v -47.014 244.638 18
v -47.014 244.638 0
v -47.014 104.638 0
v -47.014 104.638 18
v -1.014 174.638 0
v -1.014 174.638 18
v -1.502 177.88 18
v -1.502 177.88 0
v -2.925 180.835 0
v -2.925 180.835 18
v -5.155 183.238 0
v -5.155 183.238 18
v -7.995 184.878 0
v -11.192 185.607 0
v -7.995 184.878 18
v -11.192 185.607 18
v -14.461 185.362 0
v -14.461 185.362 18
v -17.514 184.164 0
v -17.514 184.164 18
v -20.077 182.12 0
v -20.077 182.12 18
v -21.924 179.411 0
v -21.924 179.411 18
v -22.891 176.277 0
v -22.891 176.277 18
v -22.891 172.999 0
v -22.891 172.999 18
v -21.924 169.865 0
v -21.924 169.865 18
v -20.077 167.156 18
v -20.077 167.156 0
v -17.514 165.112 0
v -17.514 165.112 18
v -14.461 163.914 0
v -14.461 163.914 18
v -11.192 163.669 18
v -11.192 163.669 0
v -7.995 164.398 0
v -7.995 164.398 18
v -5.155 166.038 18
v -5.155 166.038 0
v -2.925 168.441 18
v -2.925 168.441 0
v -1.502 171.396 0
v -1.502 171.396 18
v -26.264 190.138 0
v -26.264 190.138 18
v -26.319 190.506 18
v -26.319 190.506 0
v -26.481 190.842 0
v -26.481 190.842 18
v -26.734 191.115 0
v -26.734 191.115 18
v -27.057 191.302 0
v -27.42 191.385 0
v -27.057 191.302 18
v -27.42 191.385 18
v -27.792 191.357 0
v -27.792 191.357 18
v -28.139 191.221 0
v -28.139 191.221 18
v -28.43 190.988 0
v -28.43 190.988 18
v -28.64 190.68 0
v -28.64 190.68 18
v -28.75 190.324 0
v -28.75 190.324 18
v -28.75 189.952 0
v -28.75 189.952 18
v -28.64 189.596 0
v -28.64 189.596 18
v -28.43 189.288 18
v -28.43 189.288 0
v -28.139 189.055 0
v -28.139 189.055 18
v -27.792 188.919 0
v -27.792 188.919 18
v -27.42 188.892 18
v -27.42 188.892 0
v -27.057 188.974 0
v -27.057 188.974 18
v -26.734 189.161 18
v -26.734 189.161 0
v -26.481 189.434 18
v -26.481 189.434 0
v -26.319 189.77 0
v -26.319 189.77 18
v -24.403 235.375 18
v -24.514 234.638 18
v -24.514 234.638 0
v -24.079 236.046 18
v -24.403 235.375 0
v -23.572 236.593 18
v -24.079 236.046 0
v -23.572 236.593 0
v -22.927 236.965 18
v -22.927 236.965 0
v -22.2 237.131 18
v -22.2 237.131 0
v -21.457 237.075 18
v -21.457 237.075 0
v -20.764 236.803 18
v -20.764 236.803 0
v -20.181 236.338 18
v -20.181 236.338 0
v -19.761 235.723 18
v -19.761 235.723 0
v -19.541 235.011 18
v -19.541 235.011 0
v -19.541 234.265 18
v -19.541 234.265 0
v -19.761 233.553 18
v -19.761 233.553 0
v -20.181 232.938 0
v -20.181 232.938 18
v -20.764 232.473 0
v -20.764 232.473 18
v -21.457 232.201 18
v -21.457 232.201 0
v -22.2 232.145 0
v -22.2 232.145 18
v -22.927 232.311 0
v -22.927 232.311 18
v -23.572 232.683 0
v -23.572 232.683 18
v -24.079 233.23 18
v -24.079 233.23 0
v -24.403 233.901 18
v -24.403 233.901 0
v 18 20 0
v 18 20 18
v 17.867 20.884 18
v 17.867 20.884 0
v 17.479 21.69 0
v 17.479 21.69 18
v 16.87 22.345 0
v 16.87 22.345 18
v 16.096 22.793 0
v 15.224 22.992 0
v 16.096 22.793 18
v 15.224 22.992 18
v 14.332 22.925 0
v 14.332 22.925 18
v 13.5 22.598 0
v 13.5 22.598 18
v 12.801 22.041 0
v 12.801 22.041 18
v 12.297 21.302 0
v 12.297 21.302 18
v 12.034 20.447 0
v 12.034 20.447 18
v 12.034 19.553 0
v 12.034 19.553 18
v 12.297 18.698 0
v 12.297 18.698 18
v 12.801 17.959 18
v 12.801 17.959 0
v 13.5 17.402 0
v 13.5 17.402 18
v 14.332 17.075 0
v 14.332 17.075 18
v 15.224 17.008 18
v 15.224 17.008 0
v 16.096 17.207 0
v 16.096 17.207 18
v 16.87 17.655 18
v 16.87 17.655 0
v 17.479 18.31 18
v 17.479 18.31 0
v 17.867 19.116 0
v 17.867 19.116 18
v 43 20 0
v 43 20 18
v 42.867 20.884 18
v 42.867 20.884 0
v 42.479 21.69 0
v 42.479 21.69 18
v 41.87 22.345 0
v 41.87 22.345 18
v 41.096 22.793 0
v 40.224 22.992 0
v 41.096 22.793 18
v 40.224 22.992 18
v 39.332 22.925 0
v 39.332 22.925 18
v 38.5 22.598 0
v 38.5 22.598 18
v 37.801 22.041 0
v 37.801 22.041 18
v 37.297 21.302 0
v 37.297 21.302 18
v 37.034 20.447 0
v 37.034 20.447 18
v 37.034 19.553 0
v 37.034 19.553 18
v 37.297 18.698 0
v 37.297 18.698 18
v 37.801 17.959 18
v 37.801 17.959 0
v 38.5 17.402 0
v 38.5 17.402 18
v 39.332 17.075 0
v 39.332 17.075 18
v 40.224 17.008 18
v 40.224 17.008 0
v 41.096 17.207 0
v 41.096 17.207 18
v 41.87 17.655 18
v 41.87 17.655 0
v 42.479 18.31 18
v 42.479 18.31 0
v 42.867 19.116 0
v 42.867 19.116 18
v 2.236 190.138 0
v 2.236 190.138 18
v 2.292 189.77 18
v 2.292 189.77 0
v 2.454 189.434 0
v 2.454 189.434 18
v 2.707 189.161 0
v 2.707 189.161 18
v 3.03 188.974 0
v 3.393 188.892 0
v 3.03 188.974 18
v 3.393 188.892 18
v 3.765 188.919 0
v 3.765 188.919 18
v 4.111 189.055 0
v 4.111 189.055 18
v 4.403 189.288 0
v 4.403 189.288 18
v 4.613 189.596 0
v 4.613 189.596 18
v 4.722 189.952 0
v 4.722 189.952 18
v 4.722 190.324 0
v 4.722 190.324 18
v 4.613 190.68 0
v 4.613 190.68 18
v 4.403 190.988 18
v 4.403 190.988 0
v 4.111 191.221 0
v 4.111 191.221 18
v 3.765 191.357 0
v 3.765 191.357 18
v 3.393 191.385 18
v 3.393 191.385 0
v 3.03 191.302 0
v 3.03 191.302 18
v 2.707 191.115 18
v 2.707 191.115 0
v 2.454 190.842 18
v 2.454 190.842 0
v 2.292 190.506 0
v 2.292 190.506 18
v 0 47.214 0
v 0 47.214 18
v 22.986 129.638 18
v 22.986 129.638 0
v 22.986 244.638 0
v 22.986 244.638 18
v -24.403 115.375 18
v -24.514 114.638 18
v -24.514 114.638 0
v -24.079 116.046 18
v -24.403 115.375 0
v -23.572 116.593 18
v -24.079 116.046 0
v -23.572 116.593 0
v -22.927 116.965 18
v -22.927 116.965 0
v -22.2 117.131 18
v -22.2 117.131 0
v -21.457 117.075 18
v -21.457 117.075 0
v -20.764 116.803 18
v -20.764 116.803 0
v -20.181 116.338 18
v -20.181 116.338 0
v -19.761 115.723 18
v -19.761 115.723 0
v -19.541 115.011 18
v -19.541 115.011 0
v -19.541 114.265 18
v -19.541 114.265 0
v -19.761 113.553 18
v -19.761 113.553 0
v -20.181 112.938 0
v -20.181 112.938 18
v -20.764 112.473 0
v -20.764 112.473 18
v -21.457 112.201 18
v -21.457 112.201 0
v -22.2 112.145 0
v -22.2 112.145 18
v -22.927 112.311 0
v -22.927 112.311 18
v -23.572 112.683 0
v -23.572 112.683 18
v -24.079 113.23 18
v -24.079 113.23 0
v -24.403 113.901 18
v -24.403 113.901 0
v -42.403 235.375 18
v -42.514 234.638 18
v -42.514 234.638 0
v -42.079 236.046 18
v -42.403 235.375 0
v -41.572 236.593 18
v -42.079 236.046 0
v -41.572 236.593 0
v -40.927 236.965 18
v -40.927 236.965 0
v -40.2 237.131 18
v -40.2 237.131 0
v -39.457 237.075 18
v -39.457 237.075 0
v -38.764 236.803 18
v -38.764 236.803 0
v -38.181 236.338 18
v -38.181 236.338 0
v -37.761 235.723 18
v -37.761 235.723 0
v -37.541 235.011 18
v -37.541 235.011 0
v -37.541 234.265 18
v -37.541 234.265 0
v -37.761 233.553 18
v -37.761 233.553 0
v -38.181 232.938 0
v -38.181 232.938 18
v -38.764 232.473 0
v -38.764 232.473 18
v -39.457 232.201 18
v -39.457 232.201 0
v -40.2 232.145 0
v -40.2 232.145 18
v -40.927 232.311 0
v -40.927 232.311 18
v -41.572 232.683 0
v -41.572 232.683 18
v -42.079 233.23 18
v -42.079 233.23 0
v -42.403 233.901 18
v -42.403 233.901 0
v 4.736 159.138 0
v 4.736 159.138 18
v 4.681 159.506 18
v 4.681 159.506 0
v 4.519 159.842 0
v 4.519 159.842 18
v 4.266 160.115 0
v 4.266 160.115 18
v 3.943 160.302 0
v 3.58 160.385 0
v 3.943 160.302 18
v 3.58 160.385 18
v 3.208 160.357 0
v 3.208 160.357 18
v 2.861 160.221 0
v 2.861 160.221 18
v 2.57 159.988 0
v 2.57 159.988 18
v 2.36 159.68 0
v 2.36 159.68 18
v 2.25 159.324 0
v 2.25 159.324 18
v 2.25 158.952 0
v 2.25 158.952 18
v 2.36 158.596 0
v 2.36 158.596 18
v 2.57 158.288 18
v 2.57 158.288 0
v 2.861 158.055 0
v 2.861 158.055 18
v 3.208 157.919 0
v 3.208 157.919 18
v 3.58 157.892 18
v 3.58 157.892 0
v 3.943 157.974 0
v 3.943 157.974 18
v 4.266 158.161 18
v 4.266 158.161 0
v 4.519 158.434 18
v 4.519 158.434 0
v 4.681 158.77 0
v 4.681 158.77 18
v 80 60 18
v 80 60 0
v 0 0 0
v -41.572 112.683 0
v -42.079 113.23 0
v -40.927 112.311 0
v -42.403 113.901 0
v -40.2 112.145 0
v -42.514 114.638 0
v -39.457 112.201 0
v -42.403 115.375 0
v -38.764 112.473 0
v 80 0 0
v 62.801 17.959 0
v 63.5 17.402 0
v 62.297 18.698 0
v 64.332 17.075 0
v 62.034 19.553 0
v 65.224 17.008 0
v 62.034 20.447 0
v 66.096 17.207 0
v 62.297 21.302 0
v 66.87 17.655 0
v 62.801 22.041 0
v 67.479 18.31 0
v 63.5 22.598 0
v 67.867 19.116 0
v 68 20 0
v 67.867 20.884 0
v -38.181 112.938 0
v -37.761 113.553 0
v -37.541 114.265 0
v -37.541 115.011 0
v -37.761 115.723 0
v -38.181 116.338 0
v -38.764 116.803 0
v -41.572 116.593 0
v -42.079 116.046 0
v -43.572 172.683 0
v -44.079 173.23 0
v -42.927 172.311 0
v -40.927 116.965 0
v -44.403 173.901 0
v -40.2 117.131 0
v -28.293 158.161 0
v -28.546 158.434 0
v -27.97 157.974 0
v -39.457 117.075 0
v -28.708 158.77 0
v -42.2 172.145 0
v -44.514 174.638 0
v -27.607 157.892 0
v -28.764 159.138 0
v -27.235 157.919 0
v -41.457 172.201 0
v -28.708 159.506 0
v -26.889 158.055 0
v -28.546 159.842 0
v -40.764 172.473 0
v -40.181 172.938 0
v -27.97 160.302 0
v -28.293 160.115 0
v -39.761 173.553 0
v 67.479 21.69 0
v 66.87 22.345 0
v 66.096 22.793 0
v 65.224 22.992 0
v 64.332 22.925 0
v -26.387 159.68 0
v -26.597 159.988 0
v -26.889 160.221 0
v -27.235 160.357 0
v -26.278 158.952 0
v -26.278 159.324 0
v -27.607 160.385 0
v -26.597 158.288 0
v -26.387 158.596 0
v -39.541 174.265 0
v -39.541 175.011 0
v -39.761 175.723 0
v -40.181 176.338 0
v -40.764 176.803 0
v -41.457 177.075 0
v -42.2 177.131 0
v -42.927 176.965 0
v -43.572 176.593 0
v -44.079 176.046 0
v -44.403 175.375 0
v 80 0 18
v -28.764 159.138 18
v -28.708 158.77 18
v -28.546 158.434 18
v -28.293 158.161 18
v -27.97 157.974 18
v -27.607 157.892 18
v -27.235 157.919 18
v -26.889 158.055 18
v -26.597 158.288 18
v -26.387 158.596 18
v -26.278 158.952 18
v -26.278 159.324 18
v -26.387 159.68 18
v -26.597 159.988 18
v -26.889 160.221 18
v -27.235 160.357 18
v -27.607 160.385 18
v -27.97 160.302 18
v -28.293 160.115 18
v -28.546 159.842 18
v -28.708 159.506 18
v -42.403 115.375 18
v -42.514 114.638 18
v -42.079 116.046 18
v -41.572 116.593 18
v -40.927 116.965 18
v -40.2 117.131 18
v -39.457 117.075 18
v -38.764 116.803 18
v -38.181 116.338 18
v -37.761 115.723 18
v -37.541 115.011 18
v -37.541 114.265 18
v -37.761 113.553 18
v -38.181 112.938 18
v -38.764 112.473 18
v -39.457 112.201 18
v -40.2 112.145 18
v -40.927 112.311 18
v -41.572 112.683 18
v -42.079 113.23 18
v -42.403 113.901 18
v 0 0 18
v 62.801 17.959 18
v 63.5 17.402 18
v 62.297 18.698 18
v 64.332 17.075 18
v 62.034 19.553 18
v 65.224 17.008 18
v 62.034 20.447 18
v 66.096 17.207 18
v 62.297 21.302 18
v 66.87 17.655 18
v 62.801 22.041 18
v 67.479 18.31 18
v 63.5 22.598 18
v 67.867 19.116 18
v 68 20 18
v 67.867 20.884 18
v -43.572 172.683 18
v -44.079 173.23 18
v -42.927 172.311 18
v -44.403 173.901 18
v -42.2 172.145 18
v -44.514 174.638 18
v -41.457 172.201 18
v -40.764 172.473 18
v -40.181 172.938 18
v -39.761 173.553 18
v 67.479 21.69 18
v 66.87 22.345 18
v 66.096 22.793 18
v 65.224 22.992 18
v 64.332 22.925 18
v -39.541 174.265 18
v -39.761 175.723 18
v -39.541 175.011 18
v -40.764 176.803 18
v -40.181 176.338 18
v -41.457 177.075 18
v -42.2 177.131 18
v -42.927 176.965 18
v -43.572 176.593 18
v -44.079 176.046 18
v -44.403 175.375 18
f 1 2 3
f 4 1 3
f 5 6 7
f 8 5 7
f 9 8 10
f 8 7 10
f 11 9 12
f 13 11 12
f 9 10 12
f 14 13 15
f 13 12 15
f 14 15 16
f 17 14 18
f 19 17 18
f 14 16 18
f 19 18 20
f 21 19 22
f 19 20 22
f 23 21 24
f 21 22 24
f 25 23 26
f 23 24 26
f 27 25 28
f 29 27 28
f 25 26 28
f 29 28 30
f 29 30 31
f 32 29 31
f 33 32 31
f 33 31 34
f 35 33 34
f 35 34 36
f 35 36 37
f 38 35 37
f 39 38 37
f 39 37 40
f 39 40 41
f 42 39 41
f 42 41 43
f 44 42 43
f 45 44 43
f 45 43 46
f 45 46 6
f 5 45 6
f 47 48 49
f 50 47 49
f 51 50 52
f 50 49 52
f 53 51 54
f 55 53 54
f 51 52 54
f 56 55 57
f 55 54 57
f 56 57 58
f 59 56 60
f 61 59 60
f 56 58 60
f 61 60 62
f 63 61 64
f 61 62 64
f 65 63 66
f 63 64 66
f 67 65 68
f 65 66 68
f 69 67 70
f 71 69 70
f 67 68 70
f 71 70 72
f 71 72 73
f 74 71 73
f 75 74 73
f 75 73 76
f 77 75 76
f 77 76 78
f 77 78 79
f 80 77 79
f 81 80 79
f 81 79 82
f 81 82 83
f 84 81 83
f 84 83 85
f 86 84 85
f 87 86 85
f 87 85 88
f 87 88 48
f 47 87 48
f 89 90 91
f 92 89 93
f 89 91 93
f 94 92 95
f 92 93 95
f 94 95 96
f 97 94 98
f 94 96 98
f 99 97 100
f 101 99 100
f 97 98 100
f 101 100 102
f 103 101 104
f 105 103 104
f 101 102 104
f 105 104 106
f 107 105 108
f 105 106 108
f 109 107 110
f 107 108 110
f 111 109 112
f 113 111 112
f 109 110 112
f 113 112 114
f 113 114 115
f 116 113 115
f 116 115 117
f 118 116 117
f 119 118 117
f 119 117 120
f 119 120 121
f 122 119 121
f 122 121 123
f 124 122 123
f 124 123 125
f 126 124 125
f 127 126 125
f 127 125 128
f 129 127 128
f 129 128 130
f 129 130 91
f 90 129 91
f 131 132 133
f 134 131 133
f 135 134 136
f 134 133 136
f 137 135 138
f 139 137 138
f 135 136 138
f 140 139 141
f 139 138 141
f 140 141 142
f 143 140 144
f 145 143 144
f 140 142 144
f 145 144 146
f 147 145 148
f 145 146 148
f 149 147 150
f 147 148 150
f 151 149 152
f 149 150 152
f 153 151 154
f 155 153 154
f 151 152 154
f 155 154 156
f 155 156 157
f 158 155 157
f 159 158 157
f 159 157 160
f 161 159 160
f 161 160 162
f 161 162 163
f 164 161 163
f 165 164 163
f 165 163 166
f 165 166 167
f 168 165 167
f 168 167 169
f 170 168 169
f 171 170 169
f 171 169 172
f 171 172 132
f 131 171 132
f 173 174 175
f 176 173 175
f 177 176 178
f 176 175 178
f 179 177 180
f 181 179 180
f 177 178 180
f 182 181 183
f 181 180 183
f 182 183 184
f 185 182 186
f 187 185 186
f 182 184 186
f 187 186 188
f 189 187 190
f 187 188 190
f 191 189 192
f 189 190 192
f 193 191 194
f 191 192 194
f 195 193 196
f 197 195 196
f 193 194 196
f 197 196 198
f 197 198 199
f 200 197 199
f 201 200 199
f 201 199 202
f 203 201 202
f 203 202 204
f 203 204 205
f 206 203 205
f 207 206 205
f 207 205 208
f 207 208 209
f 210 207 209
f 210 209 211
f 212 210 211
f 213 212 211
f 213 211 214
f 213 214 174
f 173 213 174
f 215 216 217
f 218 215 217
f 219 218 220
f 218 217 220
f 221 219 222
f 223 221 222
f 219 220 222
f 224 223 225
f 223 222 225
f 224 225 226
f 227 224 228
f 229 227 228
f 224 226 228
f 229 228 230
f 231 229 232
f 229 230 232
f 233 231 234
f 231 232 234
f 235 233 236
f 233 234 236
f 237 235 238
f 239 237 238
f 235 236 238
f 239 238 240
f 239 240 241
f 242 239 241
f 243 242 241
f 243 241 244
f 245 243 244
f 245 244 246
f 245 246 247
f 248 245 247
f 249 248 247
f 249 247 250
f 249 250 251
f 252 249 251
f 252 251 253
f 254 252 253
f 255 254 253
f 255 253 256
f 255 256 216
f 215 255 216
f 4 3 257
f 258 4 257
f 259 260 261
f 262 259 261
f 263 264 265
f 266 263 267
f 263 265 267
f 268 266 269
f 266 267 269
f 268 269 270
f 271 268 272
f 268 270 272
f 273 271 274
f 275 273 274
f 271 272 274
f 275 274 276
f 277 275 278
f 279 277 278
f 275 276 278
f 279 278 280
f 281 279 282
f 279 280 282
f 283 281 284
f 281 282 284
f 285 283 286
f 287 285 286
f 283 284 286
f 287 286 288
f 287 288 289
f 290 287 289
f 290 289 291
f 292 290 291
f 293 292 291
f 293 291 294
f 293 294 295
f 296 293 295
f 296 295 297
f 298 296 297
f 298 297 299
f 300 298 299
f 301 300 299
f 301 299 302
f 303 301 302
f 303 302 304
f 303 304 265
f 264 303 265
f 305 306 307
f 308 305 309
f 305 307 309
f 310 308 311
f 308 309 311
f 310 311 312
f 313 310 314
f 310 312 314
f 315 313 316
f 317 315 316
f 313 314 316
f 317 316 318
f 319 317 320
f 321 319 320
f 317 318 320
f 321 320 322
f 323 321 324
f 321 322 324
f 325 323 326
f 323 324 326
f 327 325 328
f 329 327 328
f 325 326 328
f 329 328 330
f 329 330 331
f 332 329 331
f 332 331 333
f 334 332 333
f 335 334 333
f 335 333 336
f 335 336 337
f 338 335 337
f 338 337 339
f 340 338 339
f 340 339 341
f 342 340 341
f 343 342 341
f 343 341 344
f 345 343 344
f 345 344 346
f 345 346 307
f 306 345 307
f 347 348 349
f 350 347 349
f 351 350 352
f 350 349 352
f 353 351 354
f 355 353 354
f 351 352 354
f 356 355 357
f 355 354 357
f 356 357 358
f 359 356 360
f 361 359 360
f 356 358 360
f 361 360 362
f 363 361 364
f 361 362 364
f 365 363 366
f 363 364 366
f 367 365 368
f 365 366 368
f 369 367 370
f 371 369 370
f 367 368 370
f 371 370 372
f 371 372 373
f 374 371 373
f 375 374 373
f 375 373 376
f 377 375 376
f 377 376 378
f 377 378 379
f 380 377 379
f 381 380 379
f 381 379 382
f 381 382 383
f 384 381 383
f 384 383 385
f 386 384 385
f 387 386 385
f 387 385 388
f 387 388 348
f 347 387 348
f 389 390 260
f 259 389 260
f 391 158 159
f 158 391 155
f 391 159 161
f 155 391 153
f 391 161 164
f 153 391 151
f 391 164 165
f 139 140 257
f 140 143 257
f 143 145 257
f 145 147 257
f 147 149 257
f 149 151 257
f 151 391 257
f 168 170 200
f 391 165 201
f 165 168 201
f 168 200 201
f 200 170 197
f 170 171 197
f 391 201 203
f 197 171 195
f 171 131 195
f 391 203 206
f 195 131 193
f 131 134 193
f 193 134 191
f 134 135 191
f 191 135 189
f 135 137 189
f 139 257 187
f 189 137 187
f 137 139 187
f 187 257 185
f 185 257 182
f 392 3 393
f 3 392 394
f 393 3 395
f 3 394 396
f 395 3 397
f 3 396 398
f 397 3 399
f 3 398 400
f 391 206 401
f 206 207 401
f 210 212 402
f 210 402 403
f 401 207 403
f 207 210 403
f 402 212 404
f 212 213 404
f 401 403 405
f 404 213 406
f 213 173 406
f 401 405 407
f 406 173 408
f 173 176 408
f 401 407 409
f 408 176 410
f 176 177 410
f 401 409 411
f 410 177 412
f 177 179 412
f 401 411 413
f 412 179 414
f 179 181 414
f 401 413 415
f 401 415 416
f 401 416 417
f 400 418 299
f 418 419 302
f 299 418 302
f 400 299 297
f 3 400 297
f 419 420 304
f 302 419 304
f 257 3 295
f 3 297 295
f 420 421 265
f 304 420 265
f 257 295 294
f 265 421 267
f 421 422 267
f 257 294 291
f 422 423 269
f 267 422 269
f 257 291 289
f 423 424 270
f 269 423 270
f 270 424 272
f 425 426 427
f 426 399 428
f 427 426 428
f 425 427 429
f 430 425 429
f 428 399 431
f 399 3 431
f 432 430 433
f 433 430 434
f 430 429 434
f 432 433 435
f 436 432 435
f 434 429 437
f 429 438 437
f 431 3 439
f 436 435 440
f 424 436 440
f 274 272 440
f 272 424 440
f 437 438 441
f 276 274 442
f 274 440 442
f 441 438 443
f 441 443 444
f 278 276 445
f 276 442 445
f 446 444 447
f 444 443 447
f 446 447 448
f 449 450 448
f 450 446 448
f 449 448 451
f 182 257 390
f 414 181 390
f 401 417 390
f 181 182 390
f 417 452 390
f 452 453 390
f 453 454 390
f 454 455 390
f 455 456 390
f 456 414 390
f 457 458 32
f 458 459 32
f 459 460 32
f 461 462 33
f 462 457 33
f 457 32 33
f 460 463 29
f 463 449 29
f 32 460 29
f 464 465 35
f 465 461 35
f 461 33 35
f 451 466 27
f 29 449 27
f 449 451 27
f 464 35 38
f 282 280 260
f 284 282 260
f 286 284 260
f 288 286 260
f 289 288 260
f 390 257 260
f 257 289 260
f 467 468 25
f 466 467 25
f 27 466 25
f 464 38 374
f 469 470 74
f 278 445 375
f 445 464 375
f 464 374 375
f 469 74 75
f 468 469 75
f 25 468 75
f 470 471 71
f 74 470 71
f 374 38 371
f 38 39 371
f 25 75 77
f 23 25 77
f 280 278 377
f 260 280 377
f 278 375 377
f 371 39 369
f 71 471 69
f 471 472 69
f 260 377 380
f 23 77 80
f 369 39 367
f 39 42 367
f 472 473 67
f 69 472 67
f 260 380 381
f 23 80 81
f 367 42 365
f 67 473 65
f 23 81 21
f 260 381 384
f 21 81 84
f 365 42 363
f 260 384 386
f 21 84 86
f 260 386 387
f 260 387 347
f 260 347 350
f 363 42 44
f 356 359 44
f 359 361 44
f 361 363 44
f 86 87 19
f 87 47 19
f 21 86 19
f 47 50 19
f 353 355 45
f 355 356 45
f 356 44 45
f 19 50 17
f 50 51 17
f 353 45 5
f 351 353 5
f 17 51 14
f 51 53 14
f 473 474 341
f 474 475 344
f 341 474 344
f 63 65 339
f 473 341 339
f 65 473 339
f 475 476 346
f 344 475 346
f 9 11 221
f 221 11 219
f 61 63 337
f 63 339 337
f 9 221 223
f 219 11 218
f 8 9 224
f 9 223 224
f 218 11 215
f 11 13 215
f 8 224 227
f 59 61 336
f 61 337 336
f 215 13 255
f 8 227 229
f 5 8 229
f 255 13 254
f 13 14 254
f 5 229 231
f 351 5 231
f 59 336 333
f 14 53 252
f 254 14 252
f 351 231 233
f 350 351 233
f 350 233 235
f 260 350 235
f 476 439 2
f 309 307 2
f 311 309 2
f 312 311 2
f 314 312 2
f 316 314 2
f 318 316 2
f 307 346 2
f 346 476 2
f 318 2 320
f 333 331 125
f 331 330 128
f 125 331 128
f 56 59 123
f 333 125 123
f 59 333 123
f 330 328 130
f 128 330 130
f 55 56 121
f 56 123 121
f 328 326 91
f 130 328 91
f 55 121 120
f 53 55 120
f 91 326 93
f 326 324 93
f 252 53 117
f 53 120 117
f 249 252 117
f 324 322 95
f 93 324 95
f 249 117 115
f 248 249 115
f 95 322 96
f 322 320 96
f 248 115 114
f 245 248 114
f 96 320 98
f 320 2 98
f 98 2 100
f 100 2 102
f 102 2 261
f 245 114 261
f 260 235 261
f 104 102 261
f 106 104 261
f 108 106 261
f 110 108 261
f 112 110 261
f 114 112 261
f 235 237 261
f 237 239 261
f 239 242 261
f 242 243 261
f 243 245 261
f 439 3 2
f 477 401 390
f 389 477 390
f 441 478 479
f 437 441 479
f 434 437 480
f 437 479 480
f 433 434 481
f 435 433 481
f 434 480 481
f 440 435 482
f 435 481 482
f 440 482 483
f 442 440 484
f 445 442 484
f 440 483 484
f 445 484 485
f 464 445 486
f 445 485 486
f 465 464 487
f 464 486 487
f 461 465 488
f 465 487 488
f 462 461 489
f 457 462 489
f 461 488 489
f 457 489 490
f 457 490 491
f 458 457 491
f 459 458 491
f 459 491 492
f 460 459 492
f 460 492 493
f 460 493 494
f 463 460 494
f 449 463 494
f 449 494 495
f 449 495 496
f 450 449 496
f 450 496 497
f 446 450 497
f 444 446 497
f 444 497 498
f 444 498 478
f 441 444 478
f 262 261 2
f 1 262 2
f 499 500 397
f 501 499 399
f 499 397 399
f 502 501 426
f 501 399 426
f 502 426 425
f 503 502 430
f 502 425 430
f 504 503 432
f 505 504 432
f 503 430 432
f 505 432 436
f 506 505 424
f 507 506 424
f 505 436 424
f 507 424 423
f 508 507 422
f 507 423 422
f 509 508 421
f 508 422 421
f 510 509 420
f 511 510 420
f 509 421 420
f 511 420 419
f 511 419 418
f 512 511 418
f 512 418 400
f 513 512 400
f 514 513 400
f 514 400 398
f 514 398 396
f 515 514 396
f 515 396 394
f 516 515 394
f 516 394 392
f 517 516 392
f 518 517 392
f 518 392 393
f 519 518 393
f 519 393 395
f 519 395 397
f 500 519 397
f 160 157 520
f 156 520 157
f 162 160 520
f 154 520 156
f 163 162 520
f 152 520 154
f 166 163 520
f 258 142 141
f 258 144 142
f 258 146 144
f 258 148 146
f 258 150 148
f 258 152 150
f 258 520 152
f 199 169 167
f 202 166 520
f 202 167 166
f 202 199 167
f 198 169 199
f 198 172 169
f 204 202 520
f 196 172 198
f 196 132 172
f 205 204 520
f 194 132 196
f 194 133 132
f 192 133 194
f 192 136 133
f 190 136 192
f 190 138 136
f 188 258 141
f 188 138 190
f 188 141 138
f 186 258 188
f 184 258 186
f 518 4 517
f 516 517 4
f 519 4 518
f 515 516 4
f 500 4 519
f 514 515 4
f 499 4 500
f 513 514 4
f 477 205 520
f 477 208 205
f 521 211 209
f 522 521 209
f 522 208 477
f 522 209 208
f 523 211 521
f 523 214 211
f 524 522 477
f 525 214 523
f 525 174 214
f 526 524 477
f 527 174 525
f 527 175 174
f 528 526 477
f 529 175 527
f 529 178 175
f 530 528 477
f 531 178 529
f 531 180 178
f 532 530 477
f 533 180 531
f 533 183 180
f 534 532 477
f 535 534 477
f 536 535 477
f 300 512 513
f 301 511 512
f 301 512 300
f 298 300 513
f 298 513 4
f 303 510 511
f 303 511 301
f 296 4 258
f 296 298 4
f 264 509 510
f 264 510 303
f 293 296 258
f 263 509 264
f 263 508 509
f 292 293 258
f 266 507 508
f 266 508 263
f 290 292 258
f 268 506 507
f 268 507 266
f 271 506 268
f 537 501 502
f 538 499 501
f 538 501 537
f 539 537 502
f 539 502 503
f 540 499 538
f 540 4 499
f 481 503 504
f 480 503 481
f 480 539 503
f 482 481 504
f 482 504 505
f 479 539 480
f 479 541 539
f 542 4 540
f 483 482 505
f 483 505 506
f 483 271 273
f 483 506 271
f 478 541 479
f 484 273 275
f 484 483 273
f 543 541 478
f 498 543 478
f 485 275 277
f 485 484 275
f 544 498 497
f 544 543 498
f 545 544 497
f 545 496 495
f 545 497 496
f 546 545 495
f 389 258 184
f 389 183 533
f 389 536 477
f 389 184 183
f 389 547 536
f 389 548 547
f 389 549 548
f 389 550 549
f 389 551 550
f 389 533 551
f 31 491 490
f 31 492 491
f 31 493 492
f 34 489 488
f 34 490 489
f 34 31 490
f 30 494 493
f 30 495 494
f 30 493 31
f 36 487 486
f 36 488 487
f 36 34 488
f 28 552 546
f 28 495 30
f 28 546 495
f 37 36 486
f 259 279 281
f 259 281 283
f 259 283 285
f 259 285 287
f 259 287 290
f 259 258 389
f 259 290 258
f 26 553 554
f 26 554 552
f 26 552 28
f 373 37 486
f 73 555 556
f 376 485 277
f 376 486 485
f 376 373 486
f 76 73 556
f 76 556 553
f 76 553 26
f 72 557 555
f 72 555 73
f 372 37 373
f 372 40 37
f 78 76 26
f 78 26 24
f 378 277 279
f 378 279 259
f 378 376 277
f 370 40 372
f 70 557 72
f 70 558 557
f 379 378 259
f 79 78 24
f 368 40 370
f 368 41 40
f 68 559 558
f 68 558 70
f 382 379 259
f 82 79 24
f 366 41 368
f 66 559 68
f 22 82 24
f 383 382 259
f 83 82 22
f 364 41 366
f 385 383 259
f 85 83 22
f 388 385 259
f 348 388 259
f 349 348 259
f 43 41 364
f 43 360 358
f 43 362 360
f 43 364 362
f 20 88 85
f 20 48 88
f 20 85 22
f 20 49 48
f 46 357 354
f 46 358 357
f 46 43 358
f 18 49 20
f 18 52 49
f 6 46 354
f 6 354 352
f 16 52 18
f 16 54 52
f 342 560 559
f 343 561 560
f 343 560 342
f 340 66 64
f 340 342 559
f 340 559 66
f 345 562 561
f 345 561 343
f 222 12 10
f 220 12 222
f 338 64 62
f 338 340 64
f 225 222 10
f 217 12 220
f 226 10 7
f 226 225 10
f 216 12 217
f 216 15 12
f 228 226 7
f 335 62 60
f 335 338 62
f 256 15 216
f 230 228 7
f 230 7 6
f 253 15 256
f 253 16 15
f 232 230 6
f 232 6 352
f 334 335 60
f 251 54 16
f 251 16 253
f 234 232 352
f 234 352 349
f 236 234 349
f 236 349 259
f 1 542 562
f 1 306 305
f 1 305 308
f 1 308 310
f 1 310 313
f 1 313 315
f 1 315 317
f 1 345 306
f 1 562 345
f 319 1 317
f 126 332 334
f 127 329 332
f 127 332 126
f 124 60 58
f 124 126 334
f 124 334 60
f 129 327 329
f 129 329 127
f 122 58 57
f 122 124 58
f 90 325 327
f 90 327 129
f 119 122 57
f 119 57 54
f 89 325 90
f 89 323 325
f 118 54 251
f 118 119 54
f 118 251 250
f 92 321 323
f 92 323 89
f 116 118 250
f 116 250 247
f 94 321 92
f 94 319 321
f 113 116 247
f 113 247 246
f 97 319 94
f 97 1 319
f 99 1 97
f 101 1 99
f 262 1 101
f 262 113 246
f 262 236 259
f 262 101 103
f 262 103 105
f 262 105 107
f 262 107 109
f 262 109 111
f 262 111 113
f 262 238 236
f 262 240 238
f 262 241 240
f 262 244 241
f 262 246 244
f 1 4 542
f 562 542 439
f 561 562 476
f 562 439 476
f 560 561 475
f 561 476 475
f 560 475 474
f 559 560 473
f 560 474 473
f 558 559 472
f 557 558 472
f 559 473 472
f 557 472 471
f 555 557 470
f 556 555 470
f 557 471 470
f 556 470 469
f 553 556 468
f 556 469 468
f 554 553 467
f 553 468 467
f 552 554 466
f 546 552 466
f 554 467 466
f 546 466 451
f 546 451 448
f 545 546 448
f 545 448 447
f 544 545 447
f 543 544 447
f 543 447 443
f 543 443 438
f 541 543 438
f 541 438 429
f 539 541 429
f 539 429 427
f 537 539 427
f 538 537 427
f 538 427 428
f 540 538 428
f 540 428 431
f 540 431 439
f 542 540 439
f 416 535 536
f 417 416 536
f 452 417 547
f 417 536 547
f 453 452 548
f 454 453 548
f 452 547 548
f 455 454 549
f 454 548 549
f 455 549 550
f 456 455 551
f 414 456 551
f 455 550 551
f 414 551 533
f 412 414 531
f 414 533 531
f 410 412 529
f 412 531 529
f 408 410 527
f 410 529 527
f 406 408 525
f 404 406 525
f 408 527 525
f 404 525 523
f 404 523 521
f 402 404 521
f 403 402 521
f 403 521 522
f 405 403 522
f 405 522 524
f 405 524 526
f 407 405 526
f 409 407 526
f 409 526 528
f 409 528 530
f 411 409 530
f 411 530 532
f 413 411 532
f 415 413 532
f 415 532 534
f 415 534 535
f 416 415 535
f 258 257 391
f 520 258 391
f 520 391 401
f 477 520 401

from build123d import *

# Parameters (mm, degrees)
EXTRUDE_1_DEPTH     = 18
HOLE_WIZARD_M6_1_D  = 5
SKETCH_6_R          = 3
CUT_EXTRUDE_1_DEPTH = 259.015029546
SKETCH_7_R          = 11
SKETCH_7_R_2        = 1.25
CUT_EXTRUDE_2_DEPTH = 259.015029546


with BuildPart() as part:
    # 草图1 → 凸台-拉伸1 (new body)
    with BuildSketch(Plane.XY):
        Polygon((0, 0), (80, 0), (80, 60), (22.986425339, 129.63800905), (22.986425339, 244.63800905), (-47.013574661, 244.63800905), (-47.013574661, 104.63800905), (0, 47.214285714), align=None)
    extrude(amount=EXTRUDE_1_DEPTH)

    # M6 螺纹孔1 (through all)
    with Locations(Plane.XY.offset(18)):
        with Locations((-40.013574661, 114.63800905), (-22.013574661, 114.63800905), (-40.013574661, 234.63800905), (-22.013574661, 234.63800905), (-42.013574661, 174.63800905)):
            Hole(HOLE_WIZARD_M6_1_D / 2)

    # 草图6 → 切除-拉伸1 (cut, through all)
    with BuildSketch(Plane.XY.offset(18)):
        with Locations((15, 20)):
            Circle(SKETCH_6_R)
        with Locations((65, 20)):
            Circle(SKETCH_6_R)
        with Locations((40, 20)):
            Circle(SKETCH_6_R)
    extrude(amount=-CUT_EXTRUDE_1_DEPTH, mode=Mode.SUBTRACT)

    # 草图7 → 切除-拉伸2 (cut, through all)
    with BuildSketch(Plane.XY.offset(18)):
        with Locations((-12.013574661, 174.63800905)):
            Circle(SKETCH_7_R)
        with Locations((-27.513574661, 190.13800905)):
            Circle(SKETCH_7_R_2)
        with Locations(Location((3.486425339, 190.13800905, 0), (0, 0, 180))):
            Circle(SKETCH_7_R_2)
        with Locations((3.486425339, 159.13800905)):
            Circle(SKETCH_7_R_2)
        with Locations(Location((-27.513574661, 159.13800905, 0), (0, 0, 180))):
            Circle(SKETCH_7_R_2)
    extrude(amount=-CUT_EXTRUDE_2_DEPTH, mode=Mode.SUBTRACT)


solid = part.part
